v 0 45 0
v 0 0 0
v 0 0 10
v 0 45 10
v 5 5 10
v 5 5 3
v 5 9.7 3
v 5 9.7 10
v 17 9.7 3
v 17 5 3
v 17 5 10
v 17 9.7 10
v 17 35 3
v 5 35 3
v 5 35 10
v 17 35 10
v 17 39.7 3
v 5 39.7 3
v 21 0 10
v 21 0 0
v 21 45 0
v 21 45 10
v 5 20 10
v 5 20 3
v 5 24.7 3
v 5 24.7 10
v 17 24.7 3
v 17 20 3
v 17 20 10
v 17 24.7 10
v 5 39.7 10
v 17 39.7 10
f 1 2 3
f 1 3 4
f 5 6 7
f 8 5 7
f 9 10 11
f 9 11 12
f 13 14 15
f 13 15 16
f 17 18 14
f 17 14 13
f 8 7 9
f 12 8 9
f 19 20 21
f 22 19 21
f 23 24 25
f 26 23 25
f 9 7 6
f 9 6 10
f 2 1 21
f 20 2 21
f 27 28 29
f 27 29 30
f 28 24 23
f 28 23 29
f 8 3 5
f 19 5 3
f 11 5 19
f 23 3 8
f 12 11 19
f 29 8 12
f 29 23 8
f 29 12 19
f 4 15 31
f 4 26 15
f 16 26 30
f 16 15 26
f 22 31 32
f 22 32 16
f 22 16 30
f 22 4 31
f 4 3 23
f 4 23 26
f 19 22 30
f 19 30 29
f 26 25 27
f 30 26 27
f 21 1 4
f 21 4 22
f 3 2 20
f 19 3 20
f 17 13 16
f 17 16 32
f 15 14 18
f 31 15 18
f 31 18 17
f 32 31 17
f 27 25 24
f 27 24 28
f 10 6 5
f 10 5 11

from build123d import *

# Parameters (mm, degrees)
BOX001_W     = 12
BOX001_H     = 4.7
BOX001_DEPTH = 11
BOX002_W     = 12
BOX002_H     = 4.7
BOX002_DEPTH = 11
BOX_W        = 12
BOX_H        = 4.7
BOX_DEPTH    = 11
BOX003_W     = 21
BOX003_H     = 45
BOX003_DEPTH = 10


with BuildPart() as box001:
    # Box001 → Box001 (new body)
    with BuildSketch(Plane(origin=(0, 15, 0), x_dir=(1, 0, 0), z_dir=(0, 0, 1))):
        with Locations((6, 2.35)):
            Rectangle(BOX001_W, BOX001_H)
    extrude(amount=BOX001_DEPTH)


with BuildPart() as box002:
    # Box002 → Box002 (new body)
    with BuildSketch(Plane(origin=(0, 30, 0), x_dir=(1, 0, 0), z_dir=(0, 0, 1))):
        with Locations((6, 2.35)):
            Rectangle(BOX002_W, BOX002_H)
    extrude(amount=BOX002_DEPTH)


with BuildPart() as ranuras:
    # Box → Box (new body)
    with BuildSketch(Plane.XY):
        with Locations((6, 2.35)):
            Rectangle(BOX_W, BOX_H)
    extrude(amount=BOX_DEPTH)

    # Fusion: union Box001, Box002
    add(box001.part)
    add(box002.part)


with BuildPart() as ranuras_1:
    # Fusion placement: moved
    add(ranuras.part.moved(Location((5, 5, 3))))


with BuildPart() as porta_pendrives:
    # Box003 → Box003 (new body)
    with BuildSketch(Plane.XY):
        with Locations((10.5, 22.5)):
            Rectangle(BOX003_W, BOX003_H)
    extrude(amount=BOX003_DEPTH)

    # Cut: cut Ranuras
    add(ranuras_1.part, mode=Mode.SUBTRACT)


solid = porta_pendrives.part
